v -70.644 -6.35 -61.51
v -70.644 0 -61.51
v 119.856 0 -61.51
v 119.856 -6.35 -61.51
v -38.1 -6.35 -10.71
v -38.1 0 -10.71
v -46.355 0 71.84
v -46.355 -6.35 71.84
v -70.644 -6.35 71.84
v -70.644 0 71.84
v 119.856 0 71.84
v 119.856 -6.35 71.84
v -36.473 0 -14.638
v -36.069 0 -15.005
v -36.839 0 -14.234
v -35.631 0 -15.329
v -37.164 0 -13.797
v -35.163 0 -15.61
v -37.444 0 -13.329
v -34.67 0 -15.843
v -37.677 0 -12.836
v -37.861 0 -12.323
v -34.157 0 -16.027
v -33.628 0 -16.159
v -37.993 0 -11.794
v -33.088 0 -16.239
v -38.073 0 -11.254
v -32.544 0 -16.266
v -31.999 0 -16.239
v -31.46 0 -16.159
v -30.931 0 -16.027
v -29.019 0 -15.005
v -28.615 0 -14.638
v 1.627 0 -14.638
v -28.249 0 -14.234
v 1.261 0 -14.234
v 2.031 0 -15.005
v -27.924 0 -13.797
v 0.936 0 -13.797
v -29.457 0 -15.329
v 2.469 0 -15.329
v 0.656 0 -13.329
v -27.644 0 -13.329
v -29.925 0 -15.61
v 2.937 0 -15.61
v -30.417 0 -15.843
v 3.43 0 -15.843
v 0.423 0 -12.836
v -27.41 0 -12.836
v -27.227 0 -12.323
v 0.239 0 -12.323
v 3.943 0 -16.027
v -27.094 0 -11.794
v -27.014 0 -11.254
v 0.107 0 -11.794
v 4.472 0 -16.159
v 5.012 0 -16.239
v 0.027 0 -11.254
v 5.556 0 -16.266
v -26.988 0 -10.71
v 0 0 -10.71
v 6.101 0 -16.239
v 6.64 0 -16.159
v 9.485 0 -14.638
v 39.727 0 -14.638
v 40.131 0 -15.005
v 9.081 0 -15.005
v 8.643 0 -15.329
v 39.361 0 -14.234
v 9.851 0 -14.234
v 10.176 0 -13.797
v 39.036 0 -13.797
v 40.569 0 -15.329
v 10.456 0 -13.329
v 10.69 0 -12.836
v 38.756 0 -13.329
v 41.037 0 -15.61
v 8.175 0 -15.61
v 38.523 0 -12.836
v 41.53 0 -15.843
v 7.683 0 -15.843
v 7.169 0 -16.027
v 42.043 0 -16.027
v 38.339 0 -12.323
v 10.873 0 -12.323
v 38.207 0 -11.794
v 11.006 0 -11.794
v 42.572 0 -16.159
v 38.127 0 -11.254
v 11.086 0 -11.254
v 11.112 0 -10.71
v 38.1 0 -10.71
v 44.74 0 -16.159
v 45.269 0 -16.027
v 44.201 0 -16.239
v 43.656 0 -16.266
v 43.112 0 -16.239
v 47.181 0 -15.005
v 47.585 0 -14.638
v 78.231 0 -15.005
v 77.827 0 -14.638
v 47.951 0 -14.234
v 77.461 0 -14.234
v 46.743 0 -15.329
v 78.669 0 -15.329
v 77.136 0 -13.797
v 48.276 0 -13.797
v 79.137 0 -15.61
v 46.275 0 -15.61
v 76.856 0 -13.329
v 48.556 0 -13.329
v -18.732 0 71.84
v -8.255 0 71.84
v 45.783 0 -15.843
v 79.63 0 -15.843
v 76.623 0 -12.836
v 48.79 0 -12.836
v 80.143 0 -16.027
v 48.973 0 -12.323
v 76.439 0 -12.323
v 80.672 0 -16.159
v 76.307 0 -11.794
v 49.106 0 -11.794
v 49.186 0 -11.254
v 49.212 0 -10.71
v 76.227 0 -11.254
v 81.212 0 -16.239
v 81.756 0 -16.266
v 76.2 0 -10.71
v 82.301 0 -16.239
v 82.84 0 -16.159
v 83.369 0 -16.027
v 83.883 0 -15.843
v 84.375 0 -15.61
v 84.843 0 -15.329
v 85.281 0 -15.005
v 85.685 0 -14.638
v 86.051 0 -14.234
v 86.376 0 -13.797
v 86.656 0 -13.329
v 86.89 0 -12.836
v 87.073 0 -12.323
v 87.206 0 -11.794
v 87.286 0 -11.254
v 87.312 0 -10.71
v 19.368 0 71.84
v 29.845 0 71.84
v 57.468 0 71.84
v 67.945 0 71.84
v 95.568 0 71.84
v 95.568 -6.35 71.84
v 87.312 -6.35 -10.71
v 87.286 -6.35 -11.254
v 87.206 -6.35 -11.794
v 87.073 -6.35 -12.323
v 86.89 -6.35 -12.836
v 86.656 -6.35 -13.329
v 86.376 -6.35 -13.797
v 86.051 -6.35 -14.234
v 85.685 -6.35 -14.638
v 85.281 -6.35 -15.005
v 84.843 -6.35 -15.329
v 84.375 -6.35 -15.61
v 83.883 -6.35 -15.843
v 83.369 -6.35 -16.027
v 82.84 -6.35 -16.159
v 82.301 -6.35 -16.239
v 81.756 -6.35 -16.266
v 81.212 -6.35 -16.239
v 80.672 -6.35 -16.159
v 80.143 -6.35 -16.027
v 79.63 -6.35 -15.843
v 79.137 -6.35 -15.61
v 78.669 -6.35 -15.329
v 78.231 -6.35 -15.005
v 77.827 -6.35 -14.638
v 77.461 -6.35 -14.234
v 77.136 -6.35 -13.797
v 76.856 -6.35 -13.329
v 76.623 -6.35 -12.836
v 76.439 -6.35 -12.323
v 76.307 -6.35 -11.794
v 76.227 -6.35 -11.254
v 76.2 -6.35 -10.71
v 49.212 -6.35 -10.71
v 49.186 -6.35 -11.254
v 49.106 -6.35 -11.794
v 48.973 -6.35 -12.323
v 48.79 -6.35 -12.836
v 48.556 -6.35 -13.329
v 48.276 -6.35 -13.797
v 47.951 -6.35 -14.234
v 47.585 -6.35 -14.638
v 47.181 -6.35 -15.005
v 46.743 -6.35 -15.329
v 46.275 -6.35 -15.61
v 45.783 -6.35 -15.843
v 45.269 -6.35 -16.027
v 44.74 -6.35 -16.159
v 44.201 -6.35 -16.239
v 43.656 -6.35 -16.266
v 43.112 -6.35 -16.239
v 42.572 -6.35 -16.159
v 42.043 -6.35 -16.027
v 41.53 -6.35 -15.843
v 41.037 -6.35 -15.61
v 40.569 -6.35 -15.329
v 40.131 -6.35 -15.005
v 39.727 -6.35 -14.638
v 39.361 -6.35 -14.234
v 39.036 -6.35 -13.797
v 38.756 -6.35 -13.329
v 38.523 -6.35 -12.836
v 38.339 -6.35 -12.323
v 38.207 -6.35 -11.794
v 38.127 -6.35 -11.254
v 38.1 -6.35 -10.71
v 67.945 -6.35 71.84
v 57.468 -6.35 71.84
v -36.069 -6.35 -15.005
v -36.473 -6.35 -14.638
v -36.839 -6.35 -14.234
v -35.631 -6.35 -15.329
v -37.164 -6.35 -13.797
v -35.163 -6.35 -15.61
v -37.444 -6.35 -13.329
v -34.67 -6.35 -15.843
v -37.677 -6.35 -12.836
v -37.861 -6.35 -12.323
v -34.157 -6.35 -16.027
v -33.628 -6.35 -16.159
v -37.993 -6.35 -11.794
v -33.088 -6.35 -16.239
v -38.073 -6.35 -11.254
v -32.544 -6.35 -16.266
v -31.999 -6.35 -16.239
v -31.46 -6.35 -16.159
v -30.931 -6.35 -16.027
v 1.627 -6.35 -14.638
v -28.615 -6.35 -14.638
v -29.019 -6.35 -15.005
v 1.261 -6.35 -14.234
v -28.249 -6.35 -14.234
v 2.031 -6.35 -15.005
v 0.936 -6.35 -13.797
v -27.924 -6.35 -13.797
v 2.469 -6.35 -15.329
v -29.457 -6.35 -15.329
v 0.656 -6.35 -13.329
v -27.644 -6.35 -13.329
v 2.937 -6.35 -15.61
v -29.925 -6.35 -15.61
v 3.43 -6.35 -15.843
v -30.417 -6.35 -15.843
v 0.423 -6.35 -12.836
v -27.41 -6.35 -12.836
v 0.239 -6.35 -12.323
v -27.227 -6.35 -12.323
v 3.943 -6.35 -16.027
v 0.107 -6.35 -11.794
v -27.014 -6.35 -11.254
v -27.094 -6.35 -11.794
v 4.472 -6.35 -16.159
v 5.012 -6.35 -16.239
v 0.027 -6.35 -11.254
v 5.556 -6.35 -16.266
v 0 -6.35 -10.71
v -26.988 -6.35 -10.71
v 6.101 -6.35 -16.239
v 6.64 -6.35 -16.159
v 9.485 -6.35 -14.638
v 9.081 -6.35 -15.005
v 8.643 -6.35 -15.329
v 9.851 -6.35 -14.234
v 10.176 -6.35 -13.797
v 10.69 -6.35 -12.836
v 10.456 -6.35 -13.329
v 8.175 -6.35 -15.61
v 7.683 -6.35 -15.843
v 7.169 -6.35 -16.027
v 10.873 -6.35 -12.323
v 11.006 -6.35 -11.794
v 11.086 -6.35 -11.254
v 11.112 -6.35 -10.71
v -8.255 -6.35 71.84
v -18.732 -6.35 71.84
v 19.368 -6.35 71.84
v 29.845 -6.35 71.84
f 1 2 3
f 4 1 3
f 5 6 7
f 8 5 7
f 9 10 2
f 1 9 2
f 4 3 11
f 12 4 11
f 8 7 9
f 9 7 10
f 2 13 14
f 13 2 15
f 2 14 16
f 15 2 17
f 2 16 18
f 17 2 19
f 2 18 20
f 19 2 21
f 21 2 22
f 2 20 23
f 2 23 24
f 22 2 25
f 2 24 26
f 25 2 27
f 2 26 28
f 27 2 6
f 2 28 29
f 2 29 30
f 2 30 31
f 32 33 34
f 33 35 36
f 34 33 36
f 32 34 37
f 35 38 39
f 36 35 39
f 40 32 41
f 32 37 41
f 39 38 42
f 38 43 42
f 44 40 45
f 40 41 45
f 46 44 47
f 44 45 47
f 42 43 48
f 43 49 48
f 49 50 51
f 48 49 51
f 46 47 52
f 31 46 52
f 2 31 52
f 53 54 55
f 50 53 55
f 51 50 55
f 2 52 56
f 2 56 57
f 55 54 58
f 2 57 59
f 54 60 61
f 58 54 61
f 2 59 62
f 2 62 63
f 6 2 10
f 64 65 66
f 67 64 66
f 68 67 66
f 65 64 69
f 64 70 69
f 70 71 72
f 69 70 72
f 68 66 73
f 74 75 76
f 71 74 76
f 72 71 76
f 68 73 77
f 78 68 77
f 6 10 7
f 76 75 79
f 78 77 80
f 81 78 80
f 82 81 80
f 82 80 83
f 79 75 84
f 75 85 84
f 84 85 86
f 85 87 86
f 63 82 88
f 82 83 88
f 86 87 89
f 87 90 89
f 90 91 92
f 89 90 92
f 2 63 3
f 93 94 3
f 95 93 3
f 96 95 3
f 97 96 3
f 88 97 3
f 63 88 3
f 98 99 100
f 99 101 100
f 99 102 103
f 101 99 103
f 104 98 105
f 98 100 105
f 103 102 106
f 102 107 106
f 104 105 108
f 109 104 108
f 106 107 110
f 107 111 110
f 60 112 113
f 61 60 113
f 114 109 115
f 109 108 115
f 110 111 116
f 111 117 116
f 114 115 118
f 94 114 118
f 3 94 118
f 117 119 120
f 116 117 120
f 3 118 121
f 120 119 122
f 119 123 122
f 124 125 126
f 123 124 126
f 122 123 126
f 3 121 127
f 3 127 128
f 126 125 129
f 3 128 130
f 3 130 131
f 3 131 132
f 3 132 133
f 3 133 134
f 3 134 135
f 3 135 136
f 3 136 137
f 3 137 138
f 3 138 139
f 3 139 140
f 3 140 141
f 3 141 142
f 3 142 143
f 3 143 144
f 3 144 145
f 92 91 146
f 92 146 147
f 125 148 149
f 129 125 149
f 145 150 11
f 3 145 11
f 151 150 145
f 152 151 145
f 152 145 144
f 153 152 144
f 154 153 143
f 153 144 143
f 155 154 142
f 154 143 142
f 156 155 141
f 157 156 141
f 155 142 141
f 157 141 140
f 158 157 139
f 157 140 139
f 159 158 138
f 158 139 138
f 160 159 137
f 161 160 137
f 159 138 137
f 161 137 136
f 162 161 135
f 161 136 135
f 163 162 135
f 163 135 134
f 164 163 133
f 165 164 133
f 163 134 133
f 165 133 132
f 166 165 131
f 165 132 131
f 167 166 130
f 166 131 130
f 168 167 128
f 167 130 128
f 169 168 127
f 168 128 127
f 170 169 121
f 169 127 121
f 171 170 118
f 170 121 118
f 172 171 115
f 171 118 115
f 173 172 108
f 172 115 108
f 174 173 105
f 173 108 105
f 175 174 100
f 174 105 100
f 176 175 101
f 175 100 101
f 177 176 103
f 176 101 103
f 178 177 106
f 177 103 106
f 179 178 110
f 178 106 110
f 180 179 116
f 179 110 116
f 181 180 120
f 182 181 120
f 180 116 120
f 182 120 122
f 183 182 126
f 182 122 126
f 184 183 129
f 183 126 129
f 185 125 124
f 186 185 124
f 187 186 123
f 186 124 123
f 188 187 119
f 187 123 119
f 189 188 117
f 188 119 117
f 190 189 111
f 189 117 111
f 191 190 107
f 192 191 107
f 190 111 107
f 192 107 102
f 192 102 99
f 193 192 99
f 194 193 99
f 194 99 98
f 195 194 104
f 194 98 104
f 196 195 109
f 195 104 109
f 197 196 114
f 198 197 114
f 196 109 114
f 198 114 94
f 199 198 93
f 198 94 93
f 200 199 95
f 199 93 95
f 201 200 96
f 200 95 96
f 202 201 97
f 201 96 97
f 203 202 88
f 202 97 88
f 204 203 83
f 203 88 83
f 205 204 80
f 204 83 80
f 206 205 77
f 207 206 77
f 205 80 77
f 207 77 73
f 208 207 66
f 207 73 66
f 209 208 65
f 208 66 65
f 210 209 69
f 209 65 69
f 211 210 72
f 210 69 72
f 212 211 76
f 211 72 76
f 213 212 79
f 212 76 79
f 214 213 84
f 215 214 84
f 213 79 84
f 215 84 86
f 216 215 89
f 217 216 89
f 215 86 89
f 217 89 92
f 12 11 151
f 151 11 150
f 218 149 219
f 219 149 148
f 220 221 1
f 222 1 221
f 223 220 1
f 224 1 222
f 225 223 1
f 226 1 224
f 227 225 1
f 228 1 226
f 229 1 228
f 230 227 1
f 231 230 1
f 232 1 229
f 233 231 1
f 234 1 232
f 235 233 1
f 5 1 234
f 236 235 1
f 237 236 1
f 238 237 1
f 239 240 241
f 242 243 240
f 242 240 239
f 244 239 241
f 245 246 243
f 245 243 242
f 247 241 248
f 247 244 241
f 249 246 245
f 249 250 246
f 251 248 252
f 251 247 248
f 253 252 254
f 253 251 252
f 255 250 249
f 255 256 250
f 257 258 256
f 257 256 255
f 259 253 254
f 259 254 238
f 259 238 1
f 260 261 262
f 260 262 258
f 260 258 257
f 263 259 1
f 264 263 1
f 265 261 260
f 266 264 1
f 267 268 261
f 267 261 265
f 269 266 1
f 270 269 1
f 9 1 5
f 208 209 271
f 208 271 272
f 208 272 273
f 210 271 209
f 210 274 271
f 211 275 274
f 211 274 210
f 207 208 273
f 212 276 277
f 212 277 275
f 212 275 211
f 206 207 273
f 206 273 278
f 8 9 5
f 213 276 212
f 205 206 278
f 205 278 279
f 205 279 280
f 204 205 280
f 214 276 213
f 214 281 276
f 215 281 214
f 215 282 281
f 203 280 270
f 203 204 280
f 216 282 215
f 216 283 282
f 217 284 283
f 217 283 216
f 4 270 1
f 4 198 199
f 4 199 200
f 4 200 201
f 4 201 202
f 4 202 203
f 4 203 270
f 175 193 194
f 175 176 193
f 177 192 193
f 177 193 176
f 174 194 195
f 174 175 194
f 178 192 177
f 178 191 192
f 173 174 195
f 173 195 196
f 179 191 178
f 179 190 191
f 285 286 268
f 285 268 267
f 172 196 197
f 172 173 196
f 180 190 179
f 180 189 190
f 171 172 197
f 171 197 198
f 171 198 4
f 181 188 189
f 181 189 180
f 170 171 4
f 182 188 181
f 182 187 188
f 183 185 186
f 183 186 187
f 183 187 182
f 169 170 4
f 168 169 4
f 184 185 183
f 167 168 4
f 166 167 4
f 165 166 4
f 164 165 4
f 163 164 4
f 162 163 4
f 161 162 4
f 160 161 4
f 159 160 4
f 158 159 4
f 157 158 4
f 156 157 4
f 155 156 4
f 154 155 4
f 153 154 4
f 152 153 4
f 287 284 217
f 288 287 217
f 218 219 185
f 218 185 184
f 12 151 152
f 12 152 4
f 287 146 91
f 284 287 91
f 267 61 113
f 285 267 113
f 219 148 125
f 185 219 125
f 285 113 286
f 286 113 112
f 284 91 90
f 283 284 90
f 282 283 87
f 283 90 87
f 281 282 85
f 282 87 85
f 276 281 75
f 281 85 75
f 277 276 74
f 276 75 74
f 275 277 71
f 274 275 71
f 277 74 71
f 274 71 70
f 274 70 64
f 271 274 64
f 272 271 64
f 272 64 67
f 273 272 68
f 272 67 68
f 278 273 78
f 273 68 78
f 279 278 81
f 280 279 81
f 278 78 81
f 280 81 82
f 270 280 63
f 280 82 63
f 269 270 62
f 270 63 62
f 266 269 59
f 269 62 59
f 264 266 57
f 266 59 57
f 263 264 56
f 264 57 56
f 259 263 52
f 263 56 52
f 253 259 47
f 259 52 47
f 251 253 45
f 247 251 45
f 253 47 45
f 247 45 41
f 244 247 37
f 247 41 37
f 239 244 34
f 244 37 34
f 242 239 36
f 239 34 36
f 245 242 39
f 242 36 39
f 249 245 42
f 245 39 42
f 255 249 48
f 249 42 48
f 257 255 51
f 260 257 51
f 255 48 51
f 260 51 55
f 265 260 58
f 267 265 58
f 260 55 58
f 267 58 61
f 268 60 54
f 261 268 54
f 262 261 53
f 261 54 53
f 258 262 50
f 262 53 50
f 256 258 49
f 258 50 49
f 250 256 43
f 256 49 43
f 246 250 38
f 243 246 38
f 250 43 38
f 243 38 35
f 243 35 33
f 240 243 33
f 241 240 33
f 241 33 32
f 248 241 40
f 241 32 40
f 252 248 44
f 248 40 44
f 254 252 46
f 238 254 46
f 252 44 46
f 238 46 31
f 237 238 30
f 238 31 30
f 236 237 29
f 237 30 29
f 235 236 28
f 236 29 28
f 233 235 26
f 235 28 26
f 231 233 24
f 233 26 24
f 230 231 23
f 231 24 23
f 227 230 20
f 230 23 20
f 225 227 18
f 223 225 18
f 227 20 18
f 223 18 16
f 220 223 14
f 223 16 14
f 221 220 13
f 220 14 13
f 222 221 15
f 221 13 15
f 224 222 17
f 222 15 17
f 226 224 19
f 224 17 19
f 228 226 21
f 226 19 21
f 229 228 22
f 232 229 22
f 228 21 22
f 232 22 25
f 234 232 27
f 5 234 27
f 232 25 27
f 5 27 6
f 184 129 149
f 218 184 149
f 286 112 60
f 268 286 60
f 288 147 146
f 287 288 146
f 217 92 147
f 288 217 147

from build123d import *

# Parameters (mm, degrees)
F0_W     = 190.5
F0_H     = 38.1
F1_DEPTH = 6.35


with BuildPart() as f1:
    # F0 (on Front) → F1 (new body)
    with BuildSketch(Plane.XZ):
        with BuildLine():
            Line((-70.64375, 21.040363), (-70.64375, -23.409637))
            Line((-70.64375, -23.409637), (119.85625, -23.409637))
            Line((119.85625, -23.409637), (119.85625, 21.040363))
            Line((119.85625, 21.040363), (119.85625, 71.840363))
            Line((119.85625, 71.840363), (95.5675, 71.840363))
            Line((95.5675, 71.840363), (90.4875, 21.040363))
            Line((90.4875, 21.040363), (87.3125, -10.709637))
            ThreePointArc((87.3125, -10.709637), (81.75625, -16.265887), (76.2, -10.709637))
            Line((76.2, -10.709637), (73.025, 21.040363))
            Line((73.025, 21.040363), (67.945, 71.840363))
            Line((67.945, 71.840363), (57.4675, 71.840363))
            Line((57.4675, 71.840363), (52.3875, 21.040363))
            Line((52.3875, 21.040363), (49.2125, -10.709637))
            ThreePointArc((49.2125, -10.709637), (43.65625, -16.265887), (38.1, -10.709637))
            Line((38.1, -10.709637), (34.925, 21.040363))
            Line((34.925, 21.040363), (29.845, 71.840363))
            Line((29.845, 71.840363), (19.3675, 71.840363))
            Line((19.3675, 71.840363), (14.2875, 21.040363))
            Line((14.2875, 21.040363), (11.1125, -10.709637))
            ThreePointArc((11.1125, -10.709637), (5.55625, -16.265887), (0, -10.709637))
            Line((0, -10.709637), (-3.175, 21.040363))
            Line((-3.175, 21.040363), (-8.255, 71.840363))
            Line((-8.255, 71.840363), (-18.7325, 71.840363))
            Line((-18.7325, 71.840363), (-23.8125, 21.040363))
            Line((-23.8125, 21.040363), (-26.9875, -10.709637))
            ThreePointArc((-26.9875, -10.709637), (-32.54375, -16.265887), (-38.1, -10.709637))
            Line((-38.1, -10.709637), (-41.275, 21.040363))
            Line((-41.275, 21.040363), (-46.355, 71.840363))
            Line((-46.355, 71.840363), (-70.64375, 71.840363))
            Line((-70.64375, 71.840363), (-70.64375, 21.040363))
        make_face()
        with Locations((24.60625, -42.459637)):
            Rectangle(F0_W, F0_H)
    extrude(amount=F1_DEPTH)


solid = f1.part
